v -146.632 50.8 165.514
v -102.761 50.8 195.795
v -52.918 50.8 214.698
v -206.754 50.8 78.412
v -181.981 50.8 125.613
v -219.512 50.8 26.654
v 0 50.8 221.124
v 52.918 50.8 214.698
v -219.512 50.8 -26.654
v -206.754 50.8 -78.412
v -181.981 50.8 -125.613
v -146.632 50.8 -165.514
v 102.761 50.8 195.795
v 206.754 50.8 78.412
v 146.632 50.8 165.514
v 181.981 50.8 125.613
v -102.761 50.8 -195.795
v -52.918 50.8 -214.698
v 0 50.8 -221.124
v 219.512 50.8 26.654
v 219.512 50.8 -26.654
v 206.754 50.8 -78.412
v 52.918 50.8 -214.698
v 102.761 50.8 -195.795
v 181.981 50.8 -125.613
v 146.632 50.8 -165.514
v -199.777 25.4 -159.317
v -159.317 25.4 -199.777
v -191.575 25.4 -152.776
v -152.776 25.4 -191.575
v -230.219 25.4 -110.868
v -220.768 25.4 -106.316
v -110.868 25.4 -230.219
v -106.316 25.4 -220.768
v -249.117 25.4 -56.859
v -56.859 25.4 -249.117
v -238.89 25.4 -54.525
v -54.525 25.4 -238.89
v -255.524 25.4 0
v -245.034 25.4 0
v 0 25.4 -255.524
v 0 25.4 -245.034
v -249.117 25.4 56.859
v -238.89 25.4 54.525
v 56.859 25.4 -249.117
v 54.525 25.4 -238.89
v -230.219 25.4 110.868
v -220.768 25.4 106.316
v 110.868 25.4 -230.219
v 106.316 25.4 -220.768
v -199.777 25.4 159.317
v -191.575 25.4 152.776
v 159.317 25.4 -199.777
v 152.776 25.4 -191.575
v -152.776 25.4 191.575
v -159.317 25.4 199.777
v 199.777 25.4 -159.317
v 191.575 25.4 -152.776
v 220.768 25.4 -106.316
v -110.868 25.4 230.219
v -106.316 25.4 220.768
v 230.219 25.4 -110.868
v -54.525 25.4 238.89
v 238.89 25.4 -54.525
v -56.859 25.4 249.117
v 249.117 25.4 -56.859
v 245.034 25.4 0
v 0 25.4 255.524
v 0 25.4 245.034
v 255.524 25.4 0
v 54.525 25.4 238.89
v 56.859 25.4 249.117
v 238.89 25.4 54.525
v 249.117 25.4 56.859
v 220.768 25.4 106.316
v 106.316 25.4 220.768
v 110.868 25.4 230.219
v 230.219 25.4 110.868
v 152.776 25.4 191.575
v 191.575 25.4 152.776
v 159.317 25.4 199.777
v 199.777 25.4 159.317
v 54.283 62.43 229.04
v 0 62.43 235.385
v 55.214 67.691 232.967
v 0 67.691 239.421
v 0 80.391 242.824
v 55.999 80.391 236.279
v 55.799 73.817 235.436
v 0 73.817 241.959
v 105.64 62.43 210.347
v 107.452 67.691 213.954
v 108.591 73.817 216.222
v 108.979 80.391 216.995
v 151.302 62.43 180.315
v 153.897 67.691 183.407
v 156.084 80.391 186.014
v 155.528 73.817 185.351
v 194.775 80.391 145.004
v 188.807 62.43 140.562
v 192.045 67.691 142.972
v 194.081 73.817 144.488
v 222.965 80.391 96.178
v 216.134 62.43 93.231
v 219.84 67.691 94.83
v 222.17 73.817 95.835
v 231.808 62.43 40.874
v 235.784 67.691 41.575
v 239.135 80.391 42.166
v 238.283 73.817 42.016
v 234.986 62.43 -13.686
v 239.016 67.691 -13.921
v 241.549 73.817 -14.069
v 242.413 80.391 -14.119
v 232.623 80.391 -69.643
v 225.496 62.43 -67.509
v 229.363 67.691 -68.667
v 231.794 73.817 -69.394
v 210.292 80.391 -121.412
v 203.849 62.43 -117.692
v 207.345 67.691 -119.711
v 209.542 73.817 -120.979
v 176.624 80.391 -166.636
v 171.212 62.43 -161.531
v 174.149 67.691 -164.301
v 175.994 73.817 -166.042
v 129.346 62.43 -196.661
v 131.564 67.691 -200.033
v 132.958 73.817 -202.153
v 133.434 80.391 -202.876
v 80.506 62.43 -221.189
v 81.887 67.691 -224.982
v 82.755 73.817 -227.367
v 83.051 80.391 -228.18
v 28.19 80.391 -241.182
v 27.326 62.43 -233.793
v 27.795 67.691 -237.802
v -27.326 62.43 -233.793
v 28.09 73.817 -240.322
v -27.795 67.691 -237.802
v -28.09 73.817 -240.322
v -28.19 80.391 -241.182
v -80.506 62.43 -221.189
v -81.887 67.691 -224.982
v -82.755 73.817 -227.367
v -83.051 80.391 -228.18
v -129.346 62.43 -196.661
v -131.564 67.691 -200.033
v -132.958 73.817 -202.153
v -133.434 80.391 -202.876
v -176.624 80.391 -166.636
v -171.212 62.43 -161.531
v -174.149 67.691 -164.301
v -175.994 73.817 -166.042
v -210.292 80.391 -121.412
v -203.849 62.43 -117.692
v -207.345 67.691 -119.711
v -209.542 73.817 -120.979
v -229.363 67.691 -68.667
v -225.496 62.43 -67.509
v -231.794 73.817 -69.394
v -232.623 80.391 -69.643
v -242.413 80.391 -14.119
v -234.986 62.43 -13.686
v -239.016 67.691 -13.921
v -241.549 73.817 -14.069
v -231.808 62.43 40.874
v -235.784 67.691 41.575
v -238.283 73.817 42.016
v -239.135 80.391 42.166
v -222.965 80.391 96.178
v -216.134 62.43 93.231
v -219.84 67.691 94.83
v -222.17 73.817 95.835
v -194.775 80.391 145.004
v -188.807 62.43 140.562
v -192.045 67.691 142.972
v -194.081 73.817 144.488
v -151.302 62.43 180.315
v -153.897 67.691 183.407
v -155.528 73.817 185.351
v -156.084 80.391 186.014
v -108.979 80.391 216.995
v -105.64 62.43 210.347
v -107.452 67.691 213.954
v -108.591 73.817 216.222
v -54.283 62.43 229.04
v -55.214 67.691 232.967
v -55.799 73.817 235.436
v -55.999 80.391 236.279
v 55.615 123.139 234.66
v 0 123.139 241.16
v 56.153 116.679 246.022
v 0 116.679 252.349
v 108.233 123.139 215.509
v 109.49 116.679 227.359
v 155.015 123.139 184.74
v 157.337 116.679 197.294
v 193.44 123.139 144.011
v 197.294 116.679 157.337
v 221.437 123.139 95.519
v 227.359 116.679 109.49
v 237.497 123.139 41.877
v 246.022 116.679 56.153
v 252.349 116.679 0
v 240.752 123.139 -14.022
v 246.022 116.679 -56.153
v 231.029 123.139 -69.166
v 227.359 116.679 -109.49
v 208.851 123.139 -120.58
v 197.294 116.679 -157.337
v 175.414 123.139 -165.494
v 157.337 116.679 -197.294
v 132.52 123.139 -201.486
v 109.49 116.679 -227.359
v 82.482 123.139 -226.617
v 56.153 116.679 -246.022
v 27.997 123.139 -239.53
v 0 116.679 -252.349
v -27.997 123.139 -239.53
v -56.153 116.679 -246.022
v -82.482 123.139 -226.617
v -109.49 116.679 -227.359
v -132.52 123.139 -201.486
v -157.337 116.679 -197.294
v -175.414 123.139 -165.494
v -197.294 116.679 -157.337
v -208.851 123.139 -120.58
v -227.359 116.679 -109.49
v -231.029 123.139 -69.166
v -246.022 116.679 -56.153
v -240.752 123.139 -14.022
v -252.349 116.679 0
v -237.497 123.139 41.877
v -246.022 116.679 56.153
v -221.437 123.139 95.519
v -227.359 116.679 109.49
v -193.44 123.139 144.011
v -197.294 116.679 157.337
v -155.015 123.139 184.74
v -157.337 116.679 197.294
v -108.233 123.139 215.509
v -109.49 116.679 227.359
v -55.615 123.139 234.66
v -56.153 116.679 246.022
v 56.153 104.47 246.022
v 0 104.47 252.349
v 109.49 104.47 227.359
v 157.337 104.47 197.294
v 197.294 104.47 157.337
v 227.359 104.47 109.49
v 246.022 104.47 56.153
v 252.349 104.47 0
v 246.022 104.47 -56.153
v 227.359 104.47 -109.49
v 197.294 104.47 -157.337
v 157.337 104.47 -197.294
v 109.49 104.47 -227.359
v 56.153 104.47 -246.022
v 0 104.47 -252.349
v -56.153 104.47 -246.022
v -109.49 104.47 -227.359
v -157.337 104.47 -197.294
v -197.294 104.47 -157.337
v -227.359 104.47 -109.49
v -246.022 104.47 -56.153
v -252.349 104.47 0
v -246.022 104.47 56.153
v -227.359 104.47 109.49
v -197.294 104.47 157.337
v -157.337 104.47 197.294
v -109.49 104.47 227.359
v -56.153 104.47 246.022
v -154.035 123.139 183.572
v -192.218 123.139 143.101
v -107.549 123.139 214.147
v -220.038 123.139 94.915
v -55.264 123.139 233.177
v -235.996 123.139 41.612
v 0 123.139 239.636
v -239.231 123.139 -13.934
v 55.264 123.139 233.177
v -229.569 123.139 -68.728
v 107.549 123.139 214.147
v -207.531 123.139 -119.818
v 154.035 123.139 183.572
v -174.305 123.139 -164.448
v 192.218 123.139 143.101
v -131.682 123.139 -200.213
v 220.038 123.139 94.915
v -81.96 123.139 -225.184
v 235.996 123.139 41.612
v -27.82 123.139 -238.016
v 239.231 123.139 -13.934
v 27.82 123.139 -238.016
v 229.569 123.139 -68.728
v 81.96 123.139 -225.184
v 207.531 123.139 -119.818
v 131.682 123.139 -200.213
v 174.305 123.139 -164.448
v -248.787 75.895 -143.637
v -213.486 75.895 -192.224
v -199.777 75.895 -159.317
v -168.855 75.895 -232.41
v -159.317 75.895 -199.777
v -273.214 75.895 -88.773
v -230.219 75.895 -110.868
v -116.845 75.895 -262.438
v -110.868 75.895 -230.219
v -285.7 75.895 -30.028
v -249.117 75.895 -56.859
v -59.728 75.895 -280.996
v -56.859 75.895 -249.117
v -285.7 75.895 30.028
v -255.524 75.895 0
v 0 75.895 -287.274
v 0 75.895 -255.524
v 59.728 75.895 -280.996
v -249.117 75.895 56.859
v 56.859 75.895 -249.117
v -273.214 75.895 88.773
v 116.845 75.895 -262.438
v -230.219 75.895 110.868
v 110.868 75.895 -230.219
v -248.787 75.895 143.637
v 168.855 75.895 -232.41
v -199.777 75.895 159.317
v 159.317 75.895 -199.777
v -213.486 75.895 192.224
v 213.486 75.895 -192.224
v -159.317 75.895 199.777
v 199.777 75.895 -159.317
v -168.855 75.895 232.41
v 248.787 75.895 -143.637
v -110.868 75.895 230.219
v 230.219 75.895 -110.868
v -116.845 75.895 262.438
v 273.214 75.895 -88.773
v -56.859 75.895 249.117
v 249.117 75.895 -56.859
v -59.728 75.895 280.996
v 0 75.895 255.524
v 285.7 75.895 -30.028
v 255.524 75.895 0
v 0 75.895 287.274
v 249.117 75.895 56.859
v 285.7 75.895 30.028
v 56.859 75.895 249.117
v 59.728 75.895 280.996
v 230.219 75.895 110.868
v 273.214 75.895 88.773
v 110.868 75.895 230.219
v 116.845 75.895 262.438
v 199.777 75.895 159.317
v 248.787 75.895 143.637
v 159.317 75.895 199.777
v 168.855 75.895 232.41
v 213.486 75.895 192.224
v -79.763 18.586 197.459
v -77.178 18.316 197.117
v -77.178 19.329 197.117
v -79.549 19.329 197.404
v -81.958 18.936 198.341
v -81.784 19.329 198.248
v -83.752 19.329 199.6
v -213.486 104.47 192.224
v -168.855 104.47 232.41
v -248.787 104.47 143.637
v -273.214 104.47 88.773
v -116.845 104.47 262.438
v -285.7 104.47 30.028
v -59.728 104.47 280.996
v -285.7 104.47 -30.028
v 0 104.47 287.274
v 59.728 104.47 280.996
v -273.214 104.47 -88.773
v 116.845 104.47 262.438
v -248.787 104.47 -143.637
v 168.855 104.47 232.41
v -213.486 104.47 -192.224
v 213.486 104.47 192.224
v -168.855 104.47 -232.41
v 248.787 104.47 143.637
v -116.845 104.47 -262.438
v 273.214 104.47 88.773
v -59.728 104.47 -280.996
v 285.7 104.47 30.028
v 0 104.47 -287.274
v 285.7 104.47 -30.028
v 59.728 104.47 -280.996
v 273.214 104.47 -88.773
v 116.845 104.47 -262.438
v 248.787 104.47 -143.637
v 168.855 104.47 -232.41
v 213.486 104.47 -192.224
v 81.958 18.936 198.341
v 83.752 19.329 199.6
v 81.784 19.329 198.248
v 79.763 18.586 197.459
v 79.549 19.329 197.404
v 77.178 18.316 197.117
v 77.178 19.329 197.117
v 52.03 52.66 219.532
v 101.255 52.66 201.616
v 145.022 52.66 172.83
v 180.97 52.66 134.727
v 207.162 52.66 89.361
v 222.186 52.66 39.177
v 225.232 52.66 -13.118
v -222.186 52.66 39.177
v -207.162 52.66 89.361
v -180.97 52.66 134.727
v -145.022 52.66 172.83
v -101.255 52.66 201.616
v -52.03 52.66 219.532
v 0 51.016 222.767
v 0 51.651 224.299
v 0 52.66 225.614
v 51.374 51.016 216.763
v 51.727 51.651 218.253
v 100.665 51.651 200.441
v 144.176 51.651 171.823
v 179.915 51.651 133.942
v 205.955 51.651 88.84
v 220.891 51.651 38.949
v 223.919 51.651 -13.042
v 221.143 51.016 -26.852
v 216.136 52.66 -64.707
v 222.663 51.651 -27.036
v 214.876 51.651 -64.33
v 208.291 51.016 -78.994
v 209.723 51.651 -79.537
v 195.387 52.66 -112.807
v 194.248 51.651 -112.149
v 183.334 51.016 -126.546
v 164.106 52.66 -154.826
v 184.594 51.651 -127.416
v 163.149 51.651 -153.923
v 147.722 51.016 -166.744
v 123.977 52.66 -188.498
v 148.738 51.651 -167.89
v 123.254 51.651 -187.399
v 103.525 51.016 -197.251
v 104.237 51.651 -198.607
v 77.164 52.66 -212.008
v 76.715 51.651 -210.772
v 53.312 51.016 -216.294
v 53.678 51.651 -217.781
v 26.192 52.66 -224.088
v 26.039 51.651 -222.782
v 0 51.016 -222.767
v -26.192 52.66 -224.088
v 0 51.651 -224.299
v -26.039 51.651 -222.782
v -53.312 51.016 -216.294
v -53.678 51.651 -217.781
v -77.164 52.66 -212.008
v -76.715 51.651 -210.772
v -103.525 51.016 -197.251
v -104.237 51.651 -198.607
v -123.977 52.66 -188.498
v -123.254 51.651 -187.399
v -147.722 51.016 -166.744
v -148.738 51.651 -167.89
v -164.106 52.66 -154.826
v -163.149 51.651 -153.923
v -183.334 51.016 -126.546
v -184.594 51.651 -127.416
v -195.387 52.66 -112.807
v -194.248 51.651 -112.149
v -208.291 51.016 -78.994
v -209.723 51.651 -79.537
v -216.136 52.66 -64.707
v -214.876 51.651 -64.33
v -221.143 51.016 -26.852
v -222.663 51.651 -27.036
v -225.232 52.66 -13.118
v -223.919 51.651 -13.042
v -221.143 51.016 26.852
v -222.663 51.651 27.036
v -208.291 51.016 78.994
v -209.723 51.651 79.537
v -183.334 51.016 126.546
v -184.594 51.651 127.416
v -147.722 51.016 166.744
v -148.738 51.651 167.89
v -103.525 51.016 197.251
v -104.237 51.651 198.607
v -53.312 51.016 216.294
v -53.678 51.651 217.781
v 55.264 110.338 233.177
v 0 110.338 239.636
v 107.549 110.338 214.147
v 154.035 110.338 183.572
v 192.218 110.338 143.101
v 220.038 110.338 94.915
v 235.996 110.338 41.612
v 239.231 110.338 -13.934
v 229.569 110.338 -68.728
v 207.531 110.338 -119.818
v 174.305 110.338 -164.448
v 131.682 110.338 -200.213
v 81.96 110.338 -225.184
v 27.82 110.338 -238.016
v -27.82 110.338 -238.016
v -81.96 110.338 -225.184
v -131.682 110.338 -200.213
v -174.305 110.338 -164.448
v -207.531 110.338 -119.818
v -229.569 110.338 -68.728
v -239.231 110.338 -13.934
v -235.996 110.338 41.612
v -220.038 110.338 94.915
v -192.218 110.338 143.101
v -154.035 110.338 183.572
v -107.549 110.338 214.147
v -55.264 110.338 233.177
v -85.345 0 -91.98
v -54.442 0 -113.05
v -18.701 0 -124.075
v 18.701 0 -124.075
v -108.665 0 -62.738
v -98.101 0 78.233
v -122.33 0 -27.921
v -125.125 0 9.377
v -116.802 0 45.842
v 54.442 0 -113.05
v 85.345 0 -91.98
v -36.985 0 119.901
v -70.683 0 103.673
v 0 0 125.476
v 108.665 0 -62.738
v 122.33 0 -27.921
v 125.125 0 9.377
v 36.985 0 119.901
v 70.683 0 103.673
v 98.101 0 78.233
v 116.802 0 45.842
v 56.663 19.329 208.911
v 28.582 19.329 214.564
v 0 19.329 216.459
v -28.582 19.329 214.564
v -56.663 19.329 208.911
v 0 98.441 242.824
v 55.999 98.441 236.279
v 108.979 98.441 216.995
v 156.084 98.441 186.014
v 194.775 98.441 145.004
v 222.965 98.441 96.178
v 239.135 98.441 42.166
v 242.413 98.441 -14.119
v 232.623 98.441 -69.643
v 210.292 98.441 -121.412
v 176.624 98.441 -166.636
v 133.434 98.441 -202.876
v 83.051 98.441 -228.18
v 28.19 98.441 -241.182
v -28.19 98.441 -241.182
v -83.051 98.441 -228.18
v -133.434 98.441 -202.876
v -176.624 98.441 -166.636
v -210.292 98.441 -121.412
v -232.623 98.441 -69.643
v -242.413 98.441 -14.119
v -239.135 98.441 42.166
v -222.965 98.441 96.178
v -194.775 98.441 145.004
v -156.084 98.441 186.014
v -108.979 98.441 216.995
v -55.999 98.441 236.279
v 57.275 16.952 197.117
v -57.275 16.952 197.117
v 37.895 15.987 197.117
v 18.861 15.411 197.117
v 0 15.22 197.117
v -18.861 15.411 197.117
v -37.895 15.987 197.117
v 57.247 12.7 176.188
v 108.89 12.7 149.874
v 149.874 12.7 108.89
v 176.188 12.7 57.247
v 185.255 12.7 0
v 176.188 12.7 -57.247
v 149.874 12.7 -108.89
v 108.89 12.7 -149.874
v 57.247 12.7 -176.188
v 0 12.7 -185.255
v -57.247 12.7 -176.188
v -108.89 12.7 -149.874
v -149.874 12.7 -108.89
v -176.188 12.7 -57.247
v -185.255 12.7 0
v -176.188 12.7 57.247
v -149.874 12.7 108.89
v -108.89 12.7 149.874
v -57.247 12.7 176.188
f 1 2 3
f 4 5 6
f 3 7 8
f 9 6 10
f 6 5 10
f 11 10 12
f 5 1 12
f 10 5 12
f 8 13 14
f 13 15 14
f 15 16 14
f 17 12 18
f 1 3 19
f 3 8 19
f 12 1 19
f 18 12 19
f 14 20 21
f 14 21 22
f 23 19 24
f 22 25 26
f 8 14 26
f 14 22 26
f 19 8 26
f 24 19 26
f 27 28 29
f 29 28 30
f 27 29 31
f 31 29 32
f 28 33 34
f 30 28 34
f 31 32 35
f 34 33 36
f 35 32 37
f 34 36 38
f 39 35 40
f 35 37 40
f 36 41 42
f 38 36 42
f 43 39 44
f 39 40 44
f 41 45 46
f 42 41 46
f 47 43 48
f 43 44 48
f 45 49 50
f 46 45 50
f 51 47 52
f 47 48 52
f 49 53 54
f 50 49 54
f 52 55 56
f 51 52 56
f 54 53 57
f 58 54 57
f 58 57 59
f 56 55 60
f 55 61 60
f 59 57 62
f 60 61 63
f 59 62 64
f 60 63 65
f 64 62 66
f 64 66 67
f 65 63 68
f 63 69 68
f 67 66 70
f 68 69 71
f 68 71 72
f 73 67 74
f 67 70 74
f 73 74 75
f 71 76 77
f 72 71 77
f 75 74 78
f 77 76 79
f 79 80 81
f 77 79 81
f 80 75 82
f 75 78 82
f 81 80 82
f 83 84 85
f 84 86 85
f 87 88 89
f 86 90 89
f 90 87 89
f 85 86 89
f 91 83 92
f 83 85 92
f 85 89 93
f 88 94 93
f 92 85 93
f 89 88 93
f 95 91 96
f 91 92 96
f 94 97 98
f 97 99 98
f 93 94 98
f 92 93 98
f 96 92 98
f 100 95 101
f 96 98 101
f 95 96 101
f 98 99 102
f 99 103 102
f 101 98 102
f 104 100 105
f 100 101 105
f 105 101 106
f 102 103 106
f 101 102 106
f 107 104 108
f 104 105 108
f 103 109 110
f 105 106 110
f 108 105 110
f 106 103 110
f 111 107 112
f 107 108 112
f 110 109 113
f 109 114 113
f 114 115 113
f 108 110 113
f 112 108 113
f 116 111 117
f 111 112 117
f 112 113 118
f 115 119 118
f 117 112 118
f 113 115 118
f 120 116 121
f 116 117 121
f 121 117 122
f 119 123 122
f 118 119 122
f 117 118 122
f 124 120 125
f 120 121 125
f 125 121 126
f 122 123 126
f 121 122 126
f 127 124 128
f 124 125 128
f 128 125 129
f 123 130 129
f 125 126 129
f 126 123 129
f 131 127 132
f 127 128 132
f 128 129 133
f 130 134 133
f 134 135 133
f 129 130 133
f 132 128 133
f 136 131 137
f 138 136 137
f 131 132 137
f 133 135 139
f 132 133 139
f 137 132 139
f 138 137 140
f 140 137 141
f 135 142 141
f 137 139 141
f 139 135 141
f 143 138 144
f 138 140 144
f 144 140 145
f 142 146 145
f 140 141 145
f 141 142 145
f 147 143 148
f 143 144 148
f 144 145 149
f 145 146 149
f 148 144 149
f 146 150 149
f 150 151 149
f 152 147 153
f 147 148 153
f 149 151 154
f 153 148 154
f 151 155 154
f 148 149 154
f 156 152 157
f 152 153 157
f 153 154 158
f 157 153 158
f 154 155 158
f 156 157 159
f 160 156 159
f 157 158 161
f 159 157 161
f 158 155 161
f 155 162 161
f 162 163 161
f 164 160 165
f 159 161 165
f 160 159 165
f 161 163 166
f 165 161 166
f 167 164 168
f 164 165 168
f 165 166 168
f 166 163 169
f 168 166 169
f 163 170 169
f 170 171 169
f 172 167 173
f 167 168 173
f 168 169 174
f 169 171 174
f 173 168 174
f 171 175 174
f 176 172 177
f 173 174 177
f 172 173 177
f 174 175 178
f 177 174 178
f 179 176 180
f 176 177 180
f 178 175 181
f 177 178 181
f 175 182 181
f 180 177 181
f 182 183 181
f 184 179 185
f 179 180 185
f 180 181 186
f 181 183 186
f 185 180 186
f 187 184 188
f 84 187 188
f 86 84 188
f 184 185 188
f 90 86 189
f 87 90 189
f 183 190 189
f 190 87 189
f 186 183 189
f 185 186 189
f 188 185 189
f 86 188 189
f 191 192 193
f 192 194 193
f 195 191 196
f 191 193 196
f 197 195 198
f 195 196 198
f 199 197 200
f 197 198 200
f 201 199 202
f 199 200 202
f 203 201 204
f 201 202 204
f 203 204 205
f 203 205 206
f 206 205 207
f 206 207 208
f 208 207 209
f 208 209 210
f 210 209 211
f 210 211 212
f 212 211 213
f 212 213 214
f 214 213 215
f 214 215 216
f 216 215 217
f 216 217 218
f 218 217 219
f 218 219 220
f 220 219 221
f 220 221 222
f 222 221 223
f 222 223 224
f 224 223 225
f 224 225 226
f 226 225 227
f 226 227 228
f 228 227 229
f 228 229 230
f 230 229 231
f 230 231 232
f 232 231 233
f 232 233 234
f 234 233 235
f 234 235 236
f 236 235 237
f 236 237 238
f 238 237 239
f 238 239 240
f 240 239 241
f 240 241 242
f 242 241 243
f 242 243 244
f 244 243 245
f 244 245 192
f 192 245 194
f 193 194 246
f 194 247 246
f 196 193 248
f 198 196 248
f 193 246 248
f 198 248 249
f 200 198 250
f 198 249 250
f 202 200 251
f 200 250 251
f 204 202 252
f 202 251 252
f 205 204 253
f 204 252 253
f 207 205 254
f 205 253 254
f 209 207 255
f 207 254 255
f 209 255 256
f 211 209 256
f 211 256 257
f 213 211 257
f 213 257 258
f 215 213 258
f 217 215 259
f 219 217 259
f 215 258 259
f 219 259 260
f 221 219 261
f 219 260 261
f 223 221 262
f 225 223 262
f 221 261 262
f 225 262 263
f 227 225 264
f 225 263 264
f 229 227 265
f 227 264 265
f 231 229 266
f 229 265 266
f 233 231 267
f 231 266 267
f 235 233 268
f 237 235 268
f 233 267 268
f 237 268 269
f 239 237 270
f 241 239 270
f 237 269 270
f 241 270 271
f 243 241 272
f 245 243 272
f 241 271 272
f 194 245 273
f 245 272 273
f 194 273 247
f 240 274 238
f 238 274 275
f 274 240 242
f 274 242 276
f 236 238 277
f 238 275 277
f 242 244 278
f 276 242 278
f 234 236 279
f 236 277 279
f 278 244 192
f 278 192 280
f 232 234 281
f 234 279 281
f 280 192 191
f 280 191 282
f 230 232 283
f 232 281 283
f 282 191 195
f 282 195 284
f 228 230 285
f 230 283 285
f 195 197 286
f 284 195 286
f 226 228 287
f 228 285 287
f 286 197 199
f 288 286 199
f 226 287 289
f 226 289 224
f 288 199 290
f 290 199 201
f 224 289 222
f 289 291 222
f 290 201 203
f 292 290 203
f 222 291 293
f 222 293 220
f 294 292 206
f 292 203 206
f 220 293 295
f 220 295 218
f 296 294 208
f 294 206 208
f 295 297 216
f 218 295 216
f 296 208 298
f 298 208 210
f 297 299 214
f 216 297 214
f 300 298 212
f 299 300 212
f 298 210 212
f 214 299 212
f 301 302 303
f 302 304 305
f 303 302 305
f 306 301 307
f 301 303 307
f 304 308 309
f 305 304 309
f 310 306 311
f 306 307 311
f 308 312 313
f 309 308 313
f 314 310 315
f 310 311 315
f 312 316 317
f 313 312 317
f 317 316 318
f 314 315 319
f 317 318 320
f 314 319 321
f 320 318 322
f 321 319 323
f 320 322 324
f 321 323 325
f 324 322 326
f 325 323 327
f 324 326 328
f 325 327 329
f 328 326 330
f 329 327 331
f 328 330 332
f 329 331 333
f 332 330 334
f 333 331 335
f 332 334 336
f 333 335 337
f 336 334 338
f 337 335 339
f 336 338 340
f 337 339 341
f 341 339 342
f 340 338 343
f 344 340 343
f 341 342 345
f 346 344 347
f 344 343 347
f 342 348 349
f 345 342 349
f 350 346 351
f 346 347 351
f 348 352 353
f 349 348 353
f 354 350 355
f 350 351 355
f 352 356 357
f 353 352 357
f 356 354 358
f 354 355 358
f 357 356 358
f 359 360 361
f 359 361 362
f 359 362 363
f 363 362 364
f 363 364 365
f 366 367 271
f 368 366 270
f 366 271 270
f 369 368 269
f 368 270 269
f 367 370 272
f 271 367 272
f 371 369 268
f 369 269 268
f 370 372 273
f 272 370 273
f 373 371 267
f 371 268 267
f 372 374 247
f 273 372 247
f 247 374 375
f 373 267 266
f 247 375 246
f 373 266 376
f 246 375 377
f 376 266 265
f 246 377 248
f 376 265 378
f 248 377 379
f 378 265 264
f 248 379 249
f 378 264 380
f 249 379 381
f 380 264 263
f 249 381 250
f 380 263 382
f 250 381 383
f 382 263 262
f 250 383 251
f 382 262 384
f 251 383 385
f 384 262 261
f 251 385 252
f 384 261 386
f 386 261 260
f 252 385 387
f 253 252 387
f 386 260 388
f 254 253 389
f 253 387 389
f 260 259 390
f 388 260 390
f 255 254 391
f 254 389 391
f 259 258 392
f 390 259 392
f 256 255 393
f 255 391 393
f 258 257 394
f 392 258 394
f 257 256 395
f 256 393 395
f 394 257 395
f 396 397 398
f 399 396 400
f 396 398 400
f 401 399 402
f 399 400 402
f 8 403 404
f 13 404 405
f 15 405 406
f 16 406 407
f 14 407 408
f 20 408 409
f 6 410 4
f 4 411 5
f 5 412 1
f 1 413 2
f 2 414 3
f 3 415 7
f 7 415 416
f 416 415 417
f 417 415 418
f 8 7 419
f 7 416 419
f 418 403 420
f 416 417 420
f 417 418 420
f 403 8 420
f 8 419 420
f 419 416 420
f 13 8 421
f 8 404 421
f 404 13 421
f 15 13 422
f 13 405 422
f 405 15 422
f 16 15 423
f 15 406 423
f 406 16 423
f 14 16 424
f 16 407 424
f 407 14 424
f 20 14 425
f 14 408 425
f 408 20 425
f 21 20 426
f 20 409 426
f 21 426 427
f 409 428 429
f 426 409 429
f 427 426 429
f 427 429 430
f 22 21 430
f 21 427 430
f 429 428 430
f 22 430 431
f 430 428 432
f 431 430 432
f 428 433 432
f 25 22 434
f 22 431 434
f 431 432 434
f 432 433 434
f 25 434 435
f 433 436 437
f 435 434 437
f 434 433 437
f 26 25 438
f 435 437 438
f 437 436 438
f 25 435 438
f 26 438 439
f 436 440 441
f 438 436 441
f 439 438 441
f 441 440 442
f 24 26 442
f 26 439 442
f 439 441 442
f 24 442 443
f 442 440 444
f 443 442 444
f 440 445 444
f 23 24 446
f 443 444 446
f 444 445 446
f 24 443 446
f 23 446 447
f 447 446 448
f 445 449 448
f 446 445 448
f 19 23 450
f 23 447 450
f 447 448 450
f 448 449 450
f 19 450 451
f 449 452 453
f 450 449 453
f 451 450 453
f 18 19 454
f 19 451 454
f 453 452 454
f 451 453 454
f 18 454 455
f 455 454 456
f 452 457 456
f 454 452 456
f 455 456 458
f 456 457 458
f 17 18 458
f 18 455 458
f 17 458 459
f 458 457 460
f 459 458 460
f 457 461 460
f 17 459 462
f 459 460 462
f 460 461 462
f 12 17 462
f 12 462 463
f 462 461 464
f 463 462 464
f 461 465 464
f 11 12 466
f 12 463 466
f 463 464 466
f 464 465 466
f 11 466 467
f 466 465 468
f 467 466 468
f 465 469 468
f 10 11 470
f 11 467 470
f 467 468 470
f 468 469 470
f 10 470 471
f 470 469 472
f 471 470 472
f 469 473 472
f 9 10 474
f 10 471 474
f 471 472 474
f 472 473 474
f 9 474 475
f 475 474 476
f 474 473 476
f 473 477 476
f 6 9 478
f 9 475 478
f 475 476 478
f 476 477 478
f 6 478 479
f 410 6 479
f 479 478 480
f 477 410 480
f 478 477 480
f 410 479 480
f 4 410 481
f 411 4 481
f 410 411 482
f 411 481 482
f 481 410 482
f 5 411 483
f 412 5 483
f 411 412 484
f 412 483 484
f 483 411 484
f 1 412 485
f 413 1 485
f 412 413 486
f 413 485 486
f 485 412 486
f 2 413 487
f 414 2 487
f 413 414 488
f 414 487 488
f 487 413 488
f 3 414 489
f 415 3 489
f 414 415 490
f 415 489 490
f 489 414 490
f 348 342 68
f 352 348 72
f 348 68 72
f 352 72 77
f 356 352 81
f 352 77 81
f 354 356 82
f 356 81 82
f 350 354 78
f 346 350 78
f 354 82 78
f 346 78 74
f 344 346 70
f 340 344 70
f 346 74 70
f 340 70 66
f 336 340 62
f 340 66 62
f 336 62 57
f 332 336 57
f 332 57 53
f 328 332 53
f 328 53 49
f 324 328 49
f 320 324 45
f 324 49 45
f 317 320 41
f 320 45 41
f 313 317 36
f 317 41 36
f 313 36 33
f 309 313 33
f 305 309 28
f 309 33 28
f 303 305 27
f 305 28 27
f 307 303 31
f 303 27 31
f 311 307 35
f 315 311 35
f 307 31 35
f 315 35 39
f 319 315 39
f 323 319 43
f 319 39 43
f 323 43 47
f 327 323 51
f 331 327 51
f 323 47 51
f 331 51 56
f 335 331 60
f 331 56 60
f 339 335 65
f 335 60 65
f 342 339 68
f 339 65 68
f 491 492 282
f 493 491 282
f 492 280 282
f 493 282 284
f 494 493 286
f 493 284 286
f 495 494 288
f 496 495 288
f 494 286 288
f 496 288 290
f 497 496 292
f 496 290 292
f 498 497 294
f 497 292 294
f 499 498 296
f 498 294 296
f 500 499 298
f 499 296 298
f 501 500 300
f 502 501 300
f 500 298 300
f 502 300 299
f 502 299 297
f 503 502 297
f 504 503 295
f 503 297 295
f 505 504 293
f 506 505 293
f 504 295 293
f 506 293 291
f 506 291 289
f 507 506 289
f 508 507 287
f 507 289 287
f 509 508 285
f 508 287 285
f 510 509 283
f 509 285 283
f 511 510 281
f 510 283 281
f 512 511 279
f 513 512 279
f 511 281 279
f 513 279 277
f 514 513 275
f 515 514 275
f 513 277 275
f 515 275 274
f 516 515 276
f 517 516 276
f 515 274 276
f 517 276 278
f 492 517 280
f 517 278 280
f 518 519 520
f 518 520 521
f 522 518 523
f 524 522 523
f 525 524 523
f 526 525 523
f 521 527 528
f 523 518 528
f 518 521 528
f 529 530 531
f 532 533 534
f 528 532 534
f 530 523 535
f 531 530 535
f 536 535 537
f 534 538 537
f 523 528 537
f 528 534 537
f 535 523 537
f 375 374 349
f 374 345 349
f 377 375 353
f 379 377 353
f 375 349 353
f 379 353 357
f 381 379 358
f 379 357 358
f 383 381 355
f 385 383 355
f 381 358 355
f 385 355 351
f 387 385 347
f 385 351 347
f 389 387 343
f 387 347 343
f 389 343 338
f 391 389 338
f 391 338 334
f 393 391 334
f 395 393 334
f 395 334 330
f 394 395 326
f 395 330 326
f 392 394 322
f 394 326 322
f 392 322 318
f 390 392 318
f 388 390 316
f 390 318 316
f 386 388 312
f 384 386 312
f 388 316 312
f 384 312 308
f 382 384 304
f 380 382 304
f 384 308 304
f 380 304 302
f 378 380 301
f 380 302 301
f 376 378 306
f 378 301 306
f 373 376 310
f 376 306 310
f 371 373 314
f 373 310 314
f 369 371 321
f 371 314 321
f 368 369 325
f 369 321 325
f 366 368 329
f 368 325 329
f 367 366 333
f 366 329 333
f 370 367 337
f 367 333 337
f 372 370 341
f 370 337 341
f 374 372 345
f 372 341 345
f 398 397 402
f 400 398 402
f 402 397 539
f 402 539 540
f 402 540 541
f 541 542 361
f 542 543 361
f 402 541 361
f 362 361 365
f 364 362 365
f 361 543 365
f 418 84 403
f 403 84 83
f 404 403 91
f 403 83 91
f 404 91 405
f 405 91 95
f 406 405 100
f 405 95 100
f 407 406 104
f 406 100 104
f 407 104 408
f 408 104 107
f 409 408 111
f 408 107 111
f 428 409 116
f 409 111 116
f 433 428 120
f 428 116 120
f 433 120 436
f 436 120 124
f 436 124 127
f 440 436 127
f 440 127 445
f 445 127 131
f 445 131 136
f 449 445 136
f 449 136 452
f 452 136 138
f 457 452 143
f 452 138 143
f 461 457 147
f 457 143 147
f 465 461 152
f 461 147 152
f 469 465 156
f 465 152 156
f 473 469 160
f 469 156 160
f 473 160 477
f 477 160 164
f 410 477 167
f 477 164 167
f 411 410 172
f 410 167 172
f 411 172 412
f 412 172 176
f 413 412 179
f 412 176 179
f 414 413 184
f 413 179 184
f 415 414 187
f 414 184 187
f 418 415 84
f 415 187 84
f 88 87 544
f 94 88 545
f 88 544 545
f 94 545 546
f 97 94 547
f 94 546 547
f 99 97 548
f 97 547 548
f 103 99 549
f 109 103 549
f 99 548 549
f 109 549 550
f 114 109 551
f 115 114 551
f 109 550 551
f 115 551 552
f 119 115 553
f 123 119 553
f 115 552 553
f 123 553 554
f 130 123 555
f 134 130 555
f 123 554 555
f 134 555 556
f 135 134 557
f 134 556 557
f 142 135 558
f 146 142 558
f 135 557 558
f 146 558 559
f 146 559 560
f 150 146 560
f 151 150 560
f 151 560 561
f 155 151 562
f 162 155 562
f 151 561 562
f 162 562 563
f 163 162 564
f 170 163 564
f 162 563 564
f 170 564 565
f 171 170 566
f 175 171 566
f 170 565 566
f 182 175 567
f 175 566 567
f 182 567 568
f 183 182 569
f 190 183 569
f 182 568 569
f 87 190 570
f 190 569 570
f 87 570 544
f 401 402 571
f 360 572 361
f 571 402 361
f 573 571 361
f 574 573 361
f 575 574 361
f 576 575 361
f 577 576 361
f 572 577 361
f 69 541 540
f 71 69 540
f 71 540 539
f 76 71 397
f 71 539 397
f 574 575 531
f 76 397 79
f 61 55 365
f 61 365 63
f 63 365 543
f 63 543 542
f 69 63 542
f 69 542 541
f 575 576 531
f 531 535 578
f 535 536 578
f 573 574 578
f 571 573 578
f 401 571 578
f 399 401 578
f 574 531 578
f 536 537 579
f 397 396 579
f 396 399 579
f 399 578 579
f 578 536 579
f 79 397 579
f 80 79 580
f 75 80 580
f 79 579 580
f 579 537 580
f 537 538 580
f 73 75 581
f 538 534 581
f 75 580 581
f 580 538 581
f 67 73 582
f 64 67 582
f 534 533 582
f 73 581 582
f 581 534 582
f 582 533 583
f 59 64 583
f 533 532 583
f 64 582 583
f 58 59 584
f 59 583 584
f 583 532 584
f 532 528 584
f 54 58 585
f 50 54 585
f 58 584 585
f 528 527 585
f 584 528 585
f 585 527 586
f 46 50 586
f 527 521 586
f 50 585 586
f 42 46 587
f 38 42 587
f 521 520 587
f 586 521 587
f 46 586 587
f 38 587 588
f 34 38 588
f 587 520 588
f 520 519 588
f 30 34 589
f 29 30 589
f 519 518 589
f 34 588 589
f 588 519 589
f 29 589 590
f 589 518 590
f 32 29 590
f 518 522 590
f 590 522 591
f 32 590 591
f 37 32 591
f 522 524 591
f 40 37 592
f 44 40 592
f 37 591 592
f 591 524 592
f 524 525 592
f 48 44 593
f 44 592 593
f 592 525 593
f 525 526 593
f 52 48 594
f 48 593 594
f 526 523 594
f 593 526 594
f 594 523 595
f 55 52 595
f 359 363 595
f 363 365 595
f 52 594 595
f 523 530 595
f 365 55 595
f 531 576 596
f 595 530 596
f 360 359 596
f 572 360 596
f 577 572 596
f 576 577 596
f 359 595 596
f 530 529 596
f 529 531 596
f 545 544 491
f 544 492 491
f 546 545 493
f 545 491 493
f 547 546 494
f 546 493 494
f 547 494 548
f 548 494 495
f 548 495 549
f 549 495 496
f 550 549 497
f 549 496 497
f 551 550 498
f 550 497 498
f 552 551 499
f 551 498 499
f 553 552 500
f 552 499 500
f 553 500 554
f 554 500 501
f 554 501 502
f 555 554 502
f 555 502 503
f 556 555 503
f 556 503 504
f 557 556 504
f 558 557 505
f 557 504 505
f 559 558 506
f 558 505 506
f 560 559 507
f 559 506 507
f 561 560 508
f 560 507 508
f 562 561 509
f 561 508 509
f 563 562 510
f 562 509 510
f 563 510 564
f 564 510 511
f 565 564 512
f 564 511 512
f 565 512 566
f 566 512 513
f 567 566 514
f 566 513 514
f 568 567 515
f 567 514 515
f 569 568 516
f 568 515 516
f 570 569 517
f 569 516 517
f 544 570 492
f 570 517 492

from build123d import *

# Parameters (mm, degrees)
F4_DEPTH = 19.3304


with BuildPart() as f1:
    # F0 (on Right) → F1 (revolve)
    with BuildSketch(Plane.YZ):
        with BuildLine():
            Line((123.1392, 241.1603), (116.679401, 252.349))
            Line((116.679401, 252.349), (104.4702, 252.349))
            Line((104.4702, 252.349), (104.4702, 287.274))
            Line((104.4702, 287.274), (75.8952, 287.274))
            Line((75.8952, 287.274), (75.8952, 255.524))
            Line((75.8952, 255.524), (25.4, 255.524))
            Line((25.4, 255.524), (25.4, 245.0338))
            Line((25.4, 245.0338), (0, 125.476))
            Line((0, 125.476), (0, 0))
            Line((0, 0), (50.8, 0))
            Line((50.8, 0), (50.8, 221.123768))
            ThreePointArc((50.8, 221.123768), (51.283365, 223.553808), (52.659872, 225.613896))
            Line((52.659872, 225.613896), (62.430488, 235.384512))
            ThreePointArc((62.430488, 235.384512), (70.670841, 240.89054), (80.391, 242.824))
            Line((80.391, 242.824), (98.440942, 242.824))
            Line((98.440942, 242.824), (110.3376, 239.6363))
            Line((110.3376, 239.6363), (123.1392, 239.6363))
            Line((123.1392, 239.6363), (123.1392, 241.1603))
        make_face()
    revolve(axis=Axis((0, 61.5696, 0), (0, 1, 0)))

    # F3 (on offset) → F4 (cut, through all)
    with BuildSketch(Plane(origin=(0, 19.3294, 0), x_dir=(-1, 0, 0), z_dir=(0, 1, 0))):
        with BuildLine():
            Line((-77.1779, 197.1167), (77.1779, 197.1167))
            ThreePointArc((77.1779, 197.1167), (87.122, 207.0608), (77.1779, 217.0049))
            Line((77.1779, 217.0049), (-77.1779, 217.0049))
            ThreePointArc((-77.1779, 217.0049), (-87.122, 207.0608), (-77.1779, 197.1167))
        make_face()
    extrude(amount=-F4_DEPTH, mode=Mode.SUBTRACT)


solid = f1.part
